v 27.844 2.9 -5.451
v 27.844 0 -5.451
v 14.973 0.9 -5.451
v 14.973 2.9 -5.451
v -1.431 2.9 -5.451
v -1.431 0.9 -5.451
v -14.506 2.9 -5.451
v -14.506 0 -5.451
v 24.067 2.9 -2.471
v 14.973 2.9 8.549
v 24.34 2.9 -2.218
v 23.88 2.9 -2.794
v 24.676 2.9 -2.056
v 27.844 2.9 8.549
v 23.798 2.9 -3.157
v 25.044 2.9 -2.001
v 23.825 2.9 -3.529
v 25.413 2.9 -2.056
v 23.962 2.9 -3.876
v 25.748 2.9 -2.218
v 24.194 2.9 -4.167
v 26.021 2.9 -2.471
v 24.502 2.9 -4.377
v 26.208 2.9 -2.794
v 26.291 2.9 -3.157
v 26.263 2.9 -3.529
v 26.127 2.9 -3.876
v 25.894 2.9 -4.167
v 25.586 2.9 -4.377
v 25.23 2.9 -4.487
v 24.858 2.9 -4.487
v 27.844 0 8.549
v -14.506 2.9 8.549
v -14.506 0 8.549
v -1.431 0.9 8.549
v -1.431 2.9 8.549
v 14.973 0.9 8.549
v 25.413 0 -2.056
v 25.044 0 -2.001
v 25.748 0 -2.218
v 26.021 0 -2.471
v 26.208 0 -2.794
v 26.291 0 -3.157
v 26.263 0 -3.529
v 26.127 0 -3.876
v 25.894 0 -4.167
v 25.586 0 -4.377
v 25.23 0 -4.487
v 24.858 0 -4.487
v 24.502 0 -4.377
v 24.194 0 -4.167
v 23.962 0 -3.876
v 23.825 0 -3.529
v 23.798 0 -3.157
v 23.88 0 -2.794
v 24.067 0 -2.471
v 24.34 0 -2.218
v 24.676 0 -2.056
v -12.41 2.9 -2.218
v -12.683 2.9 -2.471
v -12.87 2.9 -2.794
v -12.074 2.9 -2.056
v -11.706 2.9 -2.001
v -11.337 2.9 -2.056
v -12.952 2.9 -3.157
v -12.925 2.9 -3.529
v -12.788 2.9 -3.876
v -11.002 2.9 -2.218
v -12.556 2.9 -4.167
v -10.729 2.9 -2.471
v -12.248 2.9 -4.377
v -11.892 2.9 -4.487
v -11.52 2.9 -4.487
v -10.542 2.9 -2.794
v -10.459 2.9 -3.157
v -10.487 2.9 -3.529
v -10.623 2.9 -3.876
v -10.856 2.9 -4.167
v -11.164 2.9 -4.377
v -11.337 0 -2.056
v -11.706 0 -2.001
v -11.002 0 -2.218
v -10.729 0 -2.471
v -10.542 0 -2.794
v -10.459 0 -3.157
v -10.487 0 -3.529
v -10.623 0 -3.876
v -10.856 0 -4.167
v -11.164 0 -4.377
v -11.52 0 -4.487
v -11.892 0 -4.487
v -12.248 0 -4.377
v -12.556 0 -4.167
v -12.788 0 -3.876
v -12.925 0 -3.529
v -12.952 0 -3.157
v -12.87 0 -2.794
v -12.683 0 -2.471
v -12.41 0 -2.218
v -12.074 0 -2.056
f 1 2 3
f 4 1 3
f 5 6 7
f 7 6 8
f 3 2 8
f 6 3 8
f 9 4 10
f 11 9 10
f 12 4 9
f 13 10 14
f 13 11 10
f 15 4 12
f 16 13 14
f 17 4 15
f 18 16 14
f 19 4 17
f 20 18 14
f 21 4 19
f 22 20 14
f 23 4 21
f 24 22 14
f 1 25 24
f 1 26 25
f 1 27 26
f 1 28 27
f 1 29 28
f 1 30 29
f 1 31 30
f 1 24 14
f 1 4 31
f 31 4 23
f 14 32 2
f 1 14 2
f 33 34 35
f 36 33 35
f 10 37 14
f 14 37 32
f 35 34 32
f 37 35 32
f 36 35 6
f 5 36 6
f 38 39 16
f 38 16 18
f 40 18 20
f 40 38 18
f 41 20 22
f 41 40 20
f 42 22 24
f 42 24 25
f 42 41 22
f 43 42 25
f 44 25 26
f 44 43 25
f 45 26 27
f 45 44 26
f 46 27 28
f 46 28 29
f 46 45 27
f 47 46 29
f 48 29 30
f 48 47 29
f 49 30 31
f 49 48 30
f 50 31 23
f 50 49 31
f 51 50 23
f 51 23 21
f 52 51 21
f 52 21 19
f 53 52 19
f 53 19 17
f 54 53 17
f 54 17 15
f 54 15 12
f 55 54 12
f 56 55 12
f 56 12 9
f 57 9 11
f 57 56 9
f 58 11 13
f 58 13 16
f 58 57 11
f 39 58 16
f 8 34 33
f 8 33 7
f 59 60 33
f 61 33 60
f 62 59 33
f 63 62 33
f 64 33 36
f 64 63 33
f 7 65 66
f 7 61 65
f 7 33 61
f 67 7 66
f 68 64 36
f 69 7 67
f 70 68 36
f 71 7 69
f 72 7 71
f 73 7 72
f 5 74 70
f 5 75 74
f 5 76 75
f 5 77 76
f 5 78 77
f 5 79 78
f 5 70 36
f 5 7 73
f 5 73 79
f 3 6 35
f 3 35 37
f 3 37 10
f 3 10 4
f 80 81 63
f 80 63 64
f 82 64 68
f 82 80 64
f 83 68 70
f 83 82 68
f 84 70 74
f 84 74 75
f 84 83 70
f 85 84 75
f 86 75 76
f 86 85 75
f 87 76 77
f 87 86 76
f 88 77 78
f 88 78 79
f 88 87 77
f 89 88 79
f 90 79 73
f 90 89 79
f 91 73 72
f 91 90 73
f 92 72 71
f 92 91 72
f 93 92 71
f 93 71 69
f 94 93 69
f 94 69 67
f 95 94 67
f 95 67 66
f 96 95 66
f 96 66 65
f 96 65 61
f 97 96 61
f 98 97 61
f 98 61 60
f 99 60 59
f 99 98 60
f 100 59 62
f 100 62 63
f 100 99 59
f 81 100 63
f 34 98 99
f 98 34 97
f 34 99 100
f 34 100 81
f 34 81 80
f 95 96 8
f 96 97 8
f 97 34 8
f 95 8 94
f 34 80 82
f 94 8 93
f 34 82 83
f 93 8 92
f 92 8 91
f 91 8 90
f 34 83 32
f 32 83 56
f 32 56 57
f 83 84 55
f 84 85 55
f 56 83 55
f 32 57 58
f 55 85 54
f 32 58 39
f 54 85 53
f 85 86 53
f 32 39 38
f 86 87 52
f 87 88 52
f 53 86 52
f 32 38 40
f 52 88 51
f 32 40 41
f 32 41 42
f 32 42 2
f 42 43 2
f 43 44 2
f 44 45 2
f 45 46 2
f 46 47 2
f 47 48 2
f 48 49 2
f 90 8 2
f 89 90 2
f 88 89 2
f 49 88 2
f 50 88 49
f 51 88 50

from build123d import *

# Parameters (mm, degrees)
SKETCH_1_W        = 13.075
SKETCH_1_H        = 14
SKETCH_1_R        = 1.25
EXTRUDE_2_DEPTH   = 2.9
SKETCH_1_W_2      = 12.871097853
EXTRUDE_2_2_DEPTH = 2.9
EXTRUDE_3_DEPTH   = 0.9


with BuildPart() as part:
    # 草图1 → 凸台-拉伸2 (new body)
    with BuildSketch(Plane(origin=(0, 0, 0), x_dir=(1, 0, 0), z_dir=(0, 1, 0))):
        with Locations((-7.968432469, -1.549350884)):
            Rectangle(SKETCH_1_W, SKETCH_1_H)
        with Locations((-11.705932469, 3.250649116)):
            Circle(SKETCH_1_R, mode=Mode.SUBTRACT)
    extrude(amount=EXTRUDE_2_DEPTH)



with BuildPart() as body_2:
    # 草图1 → Extrude 2 2 (new body)
    with BuildSketch(Plane(origin=(0, 0, 0), x_dir=(1, 0, 0), z_dir=(0, 1, 0))):
        with Locations((21.408518604, -1.549350884)):
            Rectangle(SKETCH_1_W_2, SKETCH_1_H)
        with Locations((25.044067531, 3.250649116)):
            Circle(SKETCH_1_R, mode=Mode.SUBTRACT)
    extrude(amount=EXTRUDE_2_2_DEPTH)


with BuildPart() as part_1:
    add(part.part)

    add(body_2.part)  # 凸台-拉伸3 merges body 2
    # 草图1<4> → 凸台-拉伸3 (add)
    with BuildSketch(Plane(origin=(0, 0, 0), x_dir=(1, 0, 0), z_dir=(0, 1, 0))):
        Polygon((14.769067531, 5.450649116), (6.669067531, 5.450649116), (-1.430932469, 5.450649116), (-1.430932469, -8.549350884), (14.972969678, -8.549350884), (14.972969678, 5.450649116), align=None)
    extrude(amount=EXTRUDE_3_DEPTH)


solid = part_1.part
